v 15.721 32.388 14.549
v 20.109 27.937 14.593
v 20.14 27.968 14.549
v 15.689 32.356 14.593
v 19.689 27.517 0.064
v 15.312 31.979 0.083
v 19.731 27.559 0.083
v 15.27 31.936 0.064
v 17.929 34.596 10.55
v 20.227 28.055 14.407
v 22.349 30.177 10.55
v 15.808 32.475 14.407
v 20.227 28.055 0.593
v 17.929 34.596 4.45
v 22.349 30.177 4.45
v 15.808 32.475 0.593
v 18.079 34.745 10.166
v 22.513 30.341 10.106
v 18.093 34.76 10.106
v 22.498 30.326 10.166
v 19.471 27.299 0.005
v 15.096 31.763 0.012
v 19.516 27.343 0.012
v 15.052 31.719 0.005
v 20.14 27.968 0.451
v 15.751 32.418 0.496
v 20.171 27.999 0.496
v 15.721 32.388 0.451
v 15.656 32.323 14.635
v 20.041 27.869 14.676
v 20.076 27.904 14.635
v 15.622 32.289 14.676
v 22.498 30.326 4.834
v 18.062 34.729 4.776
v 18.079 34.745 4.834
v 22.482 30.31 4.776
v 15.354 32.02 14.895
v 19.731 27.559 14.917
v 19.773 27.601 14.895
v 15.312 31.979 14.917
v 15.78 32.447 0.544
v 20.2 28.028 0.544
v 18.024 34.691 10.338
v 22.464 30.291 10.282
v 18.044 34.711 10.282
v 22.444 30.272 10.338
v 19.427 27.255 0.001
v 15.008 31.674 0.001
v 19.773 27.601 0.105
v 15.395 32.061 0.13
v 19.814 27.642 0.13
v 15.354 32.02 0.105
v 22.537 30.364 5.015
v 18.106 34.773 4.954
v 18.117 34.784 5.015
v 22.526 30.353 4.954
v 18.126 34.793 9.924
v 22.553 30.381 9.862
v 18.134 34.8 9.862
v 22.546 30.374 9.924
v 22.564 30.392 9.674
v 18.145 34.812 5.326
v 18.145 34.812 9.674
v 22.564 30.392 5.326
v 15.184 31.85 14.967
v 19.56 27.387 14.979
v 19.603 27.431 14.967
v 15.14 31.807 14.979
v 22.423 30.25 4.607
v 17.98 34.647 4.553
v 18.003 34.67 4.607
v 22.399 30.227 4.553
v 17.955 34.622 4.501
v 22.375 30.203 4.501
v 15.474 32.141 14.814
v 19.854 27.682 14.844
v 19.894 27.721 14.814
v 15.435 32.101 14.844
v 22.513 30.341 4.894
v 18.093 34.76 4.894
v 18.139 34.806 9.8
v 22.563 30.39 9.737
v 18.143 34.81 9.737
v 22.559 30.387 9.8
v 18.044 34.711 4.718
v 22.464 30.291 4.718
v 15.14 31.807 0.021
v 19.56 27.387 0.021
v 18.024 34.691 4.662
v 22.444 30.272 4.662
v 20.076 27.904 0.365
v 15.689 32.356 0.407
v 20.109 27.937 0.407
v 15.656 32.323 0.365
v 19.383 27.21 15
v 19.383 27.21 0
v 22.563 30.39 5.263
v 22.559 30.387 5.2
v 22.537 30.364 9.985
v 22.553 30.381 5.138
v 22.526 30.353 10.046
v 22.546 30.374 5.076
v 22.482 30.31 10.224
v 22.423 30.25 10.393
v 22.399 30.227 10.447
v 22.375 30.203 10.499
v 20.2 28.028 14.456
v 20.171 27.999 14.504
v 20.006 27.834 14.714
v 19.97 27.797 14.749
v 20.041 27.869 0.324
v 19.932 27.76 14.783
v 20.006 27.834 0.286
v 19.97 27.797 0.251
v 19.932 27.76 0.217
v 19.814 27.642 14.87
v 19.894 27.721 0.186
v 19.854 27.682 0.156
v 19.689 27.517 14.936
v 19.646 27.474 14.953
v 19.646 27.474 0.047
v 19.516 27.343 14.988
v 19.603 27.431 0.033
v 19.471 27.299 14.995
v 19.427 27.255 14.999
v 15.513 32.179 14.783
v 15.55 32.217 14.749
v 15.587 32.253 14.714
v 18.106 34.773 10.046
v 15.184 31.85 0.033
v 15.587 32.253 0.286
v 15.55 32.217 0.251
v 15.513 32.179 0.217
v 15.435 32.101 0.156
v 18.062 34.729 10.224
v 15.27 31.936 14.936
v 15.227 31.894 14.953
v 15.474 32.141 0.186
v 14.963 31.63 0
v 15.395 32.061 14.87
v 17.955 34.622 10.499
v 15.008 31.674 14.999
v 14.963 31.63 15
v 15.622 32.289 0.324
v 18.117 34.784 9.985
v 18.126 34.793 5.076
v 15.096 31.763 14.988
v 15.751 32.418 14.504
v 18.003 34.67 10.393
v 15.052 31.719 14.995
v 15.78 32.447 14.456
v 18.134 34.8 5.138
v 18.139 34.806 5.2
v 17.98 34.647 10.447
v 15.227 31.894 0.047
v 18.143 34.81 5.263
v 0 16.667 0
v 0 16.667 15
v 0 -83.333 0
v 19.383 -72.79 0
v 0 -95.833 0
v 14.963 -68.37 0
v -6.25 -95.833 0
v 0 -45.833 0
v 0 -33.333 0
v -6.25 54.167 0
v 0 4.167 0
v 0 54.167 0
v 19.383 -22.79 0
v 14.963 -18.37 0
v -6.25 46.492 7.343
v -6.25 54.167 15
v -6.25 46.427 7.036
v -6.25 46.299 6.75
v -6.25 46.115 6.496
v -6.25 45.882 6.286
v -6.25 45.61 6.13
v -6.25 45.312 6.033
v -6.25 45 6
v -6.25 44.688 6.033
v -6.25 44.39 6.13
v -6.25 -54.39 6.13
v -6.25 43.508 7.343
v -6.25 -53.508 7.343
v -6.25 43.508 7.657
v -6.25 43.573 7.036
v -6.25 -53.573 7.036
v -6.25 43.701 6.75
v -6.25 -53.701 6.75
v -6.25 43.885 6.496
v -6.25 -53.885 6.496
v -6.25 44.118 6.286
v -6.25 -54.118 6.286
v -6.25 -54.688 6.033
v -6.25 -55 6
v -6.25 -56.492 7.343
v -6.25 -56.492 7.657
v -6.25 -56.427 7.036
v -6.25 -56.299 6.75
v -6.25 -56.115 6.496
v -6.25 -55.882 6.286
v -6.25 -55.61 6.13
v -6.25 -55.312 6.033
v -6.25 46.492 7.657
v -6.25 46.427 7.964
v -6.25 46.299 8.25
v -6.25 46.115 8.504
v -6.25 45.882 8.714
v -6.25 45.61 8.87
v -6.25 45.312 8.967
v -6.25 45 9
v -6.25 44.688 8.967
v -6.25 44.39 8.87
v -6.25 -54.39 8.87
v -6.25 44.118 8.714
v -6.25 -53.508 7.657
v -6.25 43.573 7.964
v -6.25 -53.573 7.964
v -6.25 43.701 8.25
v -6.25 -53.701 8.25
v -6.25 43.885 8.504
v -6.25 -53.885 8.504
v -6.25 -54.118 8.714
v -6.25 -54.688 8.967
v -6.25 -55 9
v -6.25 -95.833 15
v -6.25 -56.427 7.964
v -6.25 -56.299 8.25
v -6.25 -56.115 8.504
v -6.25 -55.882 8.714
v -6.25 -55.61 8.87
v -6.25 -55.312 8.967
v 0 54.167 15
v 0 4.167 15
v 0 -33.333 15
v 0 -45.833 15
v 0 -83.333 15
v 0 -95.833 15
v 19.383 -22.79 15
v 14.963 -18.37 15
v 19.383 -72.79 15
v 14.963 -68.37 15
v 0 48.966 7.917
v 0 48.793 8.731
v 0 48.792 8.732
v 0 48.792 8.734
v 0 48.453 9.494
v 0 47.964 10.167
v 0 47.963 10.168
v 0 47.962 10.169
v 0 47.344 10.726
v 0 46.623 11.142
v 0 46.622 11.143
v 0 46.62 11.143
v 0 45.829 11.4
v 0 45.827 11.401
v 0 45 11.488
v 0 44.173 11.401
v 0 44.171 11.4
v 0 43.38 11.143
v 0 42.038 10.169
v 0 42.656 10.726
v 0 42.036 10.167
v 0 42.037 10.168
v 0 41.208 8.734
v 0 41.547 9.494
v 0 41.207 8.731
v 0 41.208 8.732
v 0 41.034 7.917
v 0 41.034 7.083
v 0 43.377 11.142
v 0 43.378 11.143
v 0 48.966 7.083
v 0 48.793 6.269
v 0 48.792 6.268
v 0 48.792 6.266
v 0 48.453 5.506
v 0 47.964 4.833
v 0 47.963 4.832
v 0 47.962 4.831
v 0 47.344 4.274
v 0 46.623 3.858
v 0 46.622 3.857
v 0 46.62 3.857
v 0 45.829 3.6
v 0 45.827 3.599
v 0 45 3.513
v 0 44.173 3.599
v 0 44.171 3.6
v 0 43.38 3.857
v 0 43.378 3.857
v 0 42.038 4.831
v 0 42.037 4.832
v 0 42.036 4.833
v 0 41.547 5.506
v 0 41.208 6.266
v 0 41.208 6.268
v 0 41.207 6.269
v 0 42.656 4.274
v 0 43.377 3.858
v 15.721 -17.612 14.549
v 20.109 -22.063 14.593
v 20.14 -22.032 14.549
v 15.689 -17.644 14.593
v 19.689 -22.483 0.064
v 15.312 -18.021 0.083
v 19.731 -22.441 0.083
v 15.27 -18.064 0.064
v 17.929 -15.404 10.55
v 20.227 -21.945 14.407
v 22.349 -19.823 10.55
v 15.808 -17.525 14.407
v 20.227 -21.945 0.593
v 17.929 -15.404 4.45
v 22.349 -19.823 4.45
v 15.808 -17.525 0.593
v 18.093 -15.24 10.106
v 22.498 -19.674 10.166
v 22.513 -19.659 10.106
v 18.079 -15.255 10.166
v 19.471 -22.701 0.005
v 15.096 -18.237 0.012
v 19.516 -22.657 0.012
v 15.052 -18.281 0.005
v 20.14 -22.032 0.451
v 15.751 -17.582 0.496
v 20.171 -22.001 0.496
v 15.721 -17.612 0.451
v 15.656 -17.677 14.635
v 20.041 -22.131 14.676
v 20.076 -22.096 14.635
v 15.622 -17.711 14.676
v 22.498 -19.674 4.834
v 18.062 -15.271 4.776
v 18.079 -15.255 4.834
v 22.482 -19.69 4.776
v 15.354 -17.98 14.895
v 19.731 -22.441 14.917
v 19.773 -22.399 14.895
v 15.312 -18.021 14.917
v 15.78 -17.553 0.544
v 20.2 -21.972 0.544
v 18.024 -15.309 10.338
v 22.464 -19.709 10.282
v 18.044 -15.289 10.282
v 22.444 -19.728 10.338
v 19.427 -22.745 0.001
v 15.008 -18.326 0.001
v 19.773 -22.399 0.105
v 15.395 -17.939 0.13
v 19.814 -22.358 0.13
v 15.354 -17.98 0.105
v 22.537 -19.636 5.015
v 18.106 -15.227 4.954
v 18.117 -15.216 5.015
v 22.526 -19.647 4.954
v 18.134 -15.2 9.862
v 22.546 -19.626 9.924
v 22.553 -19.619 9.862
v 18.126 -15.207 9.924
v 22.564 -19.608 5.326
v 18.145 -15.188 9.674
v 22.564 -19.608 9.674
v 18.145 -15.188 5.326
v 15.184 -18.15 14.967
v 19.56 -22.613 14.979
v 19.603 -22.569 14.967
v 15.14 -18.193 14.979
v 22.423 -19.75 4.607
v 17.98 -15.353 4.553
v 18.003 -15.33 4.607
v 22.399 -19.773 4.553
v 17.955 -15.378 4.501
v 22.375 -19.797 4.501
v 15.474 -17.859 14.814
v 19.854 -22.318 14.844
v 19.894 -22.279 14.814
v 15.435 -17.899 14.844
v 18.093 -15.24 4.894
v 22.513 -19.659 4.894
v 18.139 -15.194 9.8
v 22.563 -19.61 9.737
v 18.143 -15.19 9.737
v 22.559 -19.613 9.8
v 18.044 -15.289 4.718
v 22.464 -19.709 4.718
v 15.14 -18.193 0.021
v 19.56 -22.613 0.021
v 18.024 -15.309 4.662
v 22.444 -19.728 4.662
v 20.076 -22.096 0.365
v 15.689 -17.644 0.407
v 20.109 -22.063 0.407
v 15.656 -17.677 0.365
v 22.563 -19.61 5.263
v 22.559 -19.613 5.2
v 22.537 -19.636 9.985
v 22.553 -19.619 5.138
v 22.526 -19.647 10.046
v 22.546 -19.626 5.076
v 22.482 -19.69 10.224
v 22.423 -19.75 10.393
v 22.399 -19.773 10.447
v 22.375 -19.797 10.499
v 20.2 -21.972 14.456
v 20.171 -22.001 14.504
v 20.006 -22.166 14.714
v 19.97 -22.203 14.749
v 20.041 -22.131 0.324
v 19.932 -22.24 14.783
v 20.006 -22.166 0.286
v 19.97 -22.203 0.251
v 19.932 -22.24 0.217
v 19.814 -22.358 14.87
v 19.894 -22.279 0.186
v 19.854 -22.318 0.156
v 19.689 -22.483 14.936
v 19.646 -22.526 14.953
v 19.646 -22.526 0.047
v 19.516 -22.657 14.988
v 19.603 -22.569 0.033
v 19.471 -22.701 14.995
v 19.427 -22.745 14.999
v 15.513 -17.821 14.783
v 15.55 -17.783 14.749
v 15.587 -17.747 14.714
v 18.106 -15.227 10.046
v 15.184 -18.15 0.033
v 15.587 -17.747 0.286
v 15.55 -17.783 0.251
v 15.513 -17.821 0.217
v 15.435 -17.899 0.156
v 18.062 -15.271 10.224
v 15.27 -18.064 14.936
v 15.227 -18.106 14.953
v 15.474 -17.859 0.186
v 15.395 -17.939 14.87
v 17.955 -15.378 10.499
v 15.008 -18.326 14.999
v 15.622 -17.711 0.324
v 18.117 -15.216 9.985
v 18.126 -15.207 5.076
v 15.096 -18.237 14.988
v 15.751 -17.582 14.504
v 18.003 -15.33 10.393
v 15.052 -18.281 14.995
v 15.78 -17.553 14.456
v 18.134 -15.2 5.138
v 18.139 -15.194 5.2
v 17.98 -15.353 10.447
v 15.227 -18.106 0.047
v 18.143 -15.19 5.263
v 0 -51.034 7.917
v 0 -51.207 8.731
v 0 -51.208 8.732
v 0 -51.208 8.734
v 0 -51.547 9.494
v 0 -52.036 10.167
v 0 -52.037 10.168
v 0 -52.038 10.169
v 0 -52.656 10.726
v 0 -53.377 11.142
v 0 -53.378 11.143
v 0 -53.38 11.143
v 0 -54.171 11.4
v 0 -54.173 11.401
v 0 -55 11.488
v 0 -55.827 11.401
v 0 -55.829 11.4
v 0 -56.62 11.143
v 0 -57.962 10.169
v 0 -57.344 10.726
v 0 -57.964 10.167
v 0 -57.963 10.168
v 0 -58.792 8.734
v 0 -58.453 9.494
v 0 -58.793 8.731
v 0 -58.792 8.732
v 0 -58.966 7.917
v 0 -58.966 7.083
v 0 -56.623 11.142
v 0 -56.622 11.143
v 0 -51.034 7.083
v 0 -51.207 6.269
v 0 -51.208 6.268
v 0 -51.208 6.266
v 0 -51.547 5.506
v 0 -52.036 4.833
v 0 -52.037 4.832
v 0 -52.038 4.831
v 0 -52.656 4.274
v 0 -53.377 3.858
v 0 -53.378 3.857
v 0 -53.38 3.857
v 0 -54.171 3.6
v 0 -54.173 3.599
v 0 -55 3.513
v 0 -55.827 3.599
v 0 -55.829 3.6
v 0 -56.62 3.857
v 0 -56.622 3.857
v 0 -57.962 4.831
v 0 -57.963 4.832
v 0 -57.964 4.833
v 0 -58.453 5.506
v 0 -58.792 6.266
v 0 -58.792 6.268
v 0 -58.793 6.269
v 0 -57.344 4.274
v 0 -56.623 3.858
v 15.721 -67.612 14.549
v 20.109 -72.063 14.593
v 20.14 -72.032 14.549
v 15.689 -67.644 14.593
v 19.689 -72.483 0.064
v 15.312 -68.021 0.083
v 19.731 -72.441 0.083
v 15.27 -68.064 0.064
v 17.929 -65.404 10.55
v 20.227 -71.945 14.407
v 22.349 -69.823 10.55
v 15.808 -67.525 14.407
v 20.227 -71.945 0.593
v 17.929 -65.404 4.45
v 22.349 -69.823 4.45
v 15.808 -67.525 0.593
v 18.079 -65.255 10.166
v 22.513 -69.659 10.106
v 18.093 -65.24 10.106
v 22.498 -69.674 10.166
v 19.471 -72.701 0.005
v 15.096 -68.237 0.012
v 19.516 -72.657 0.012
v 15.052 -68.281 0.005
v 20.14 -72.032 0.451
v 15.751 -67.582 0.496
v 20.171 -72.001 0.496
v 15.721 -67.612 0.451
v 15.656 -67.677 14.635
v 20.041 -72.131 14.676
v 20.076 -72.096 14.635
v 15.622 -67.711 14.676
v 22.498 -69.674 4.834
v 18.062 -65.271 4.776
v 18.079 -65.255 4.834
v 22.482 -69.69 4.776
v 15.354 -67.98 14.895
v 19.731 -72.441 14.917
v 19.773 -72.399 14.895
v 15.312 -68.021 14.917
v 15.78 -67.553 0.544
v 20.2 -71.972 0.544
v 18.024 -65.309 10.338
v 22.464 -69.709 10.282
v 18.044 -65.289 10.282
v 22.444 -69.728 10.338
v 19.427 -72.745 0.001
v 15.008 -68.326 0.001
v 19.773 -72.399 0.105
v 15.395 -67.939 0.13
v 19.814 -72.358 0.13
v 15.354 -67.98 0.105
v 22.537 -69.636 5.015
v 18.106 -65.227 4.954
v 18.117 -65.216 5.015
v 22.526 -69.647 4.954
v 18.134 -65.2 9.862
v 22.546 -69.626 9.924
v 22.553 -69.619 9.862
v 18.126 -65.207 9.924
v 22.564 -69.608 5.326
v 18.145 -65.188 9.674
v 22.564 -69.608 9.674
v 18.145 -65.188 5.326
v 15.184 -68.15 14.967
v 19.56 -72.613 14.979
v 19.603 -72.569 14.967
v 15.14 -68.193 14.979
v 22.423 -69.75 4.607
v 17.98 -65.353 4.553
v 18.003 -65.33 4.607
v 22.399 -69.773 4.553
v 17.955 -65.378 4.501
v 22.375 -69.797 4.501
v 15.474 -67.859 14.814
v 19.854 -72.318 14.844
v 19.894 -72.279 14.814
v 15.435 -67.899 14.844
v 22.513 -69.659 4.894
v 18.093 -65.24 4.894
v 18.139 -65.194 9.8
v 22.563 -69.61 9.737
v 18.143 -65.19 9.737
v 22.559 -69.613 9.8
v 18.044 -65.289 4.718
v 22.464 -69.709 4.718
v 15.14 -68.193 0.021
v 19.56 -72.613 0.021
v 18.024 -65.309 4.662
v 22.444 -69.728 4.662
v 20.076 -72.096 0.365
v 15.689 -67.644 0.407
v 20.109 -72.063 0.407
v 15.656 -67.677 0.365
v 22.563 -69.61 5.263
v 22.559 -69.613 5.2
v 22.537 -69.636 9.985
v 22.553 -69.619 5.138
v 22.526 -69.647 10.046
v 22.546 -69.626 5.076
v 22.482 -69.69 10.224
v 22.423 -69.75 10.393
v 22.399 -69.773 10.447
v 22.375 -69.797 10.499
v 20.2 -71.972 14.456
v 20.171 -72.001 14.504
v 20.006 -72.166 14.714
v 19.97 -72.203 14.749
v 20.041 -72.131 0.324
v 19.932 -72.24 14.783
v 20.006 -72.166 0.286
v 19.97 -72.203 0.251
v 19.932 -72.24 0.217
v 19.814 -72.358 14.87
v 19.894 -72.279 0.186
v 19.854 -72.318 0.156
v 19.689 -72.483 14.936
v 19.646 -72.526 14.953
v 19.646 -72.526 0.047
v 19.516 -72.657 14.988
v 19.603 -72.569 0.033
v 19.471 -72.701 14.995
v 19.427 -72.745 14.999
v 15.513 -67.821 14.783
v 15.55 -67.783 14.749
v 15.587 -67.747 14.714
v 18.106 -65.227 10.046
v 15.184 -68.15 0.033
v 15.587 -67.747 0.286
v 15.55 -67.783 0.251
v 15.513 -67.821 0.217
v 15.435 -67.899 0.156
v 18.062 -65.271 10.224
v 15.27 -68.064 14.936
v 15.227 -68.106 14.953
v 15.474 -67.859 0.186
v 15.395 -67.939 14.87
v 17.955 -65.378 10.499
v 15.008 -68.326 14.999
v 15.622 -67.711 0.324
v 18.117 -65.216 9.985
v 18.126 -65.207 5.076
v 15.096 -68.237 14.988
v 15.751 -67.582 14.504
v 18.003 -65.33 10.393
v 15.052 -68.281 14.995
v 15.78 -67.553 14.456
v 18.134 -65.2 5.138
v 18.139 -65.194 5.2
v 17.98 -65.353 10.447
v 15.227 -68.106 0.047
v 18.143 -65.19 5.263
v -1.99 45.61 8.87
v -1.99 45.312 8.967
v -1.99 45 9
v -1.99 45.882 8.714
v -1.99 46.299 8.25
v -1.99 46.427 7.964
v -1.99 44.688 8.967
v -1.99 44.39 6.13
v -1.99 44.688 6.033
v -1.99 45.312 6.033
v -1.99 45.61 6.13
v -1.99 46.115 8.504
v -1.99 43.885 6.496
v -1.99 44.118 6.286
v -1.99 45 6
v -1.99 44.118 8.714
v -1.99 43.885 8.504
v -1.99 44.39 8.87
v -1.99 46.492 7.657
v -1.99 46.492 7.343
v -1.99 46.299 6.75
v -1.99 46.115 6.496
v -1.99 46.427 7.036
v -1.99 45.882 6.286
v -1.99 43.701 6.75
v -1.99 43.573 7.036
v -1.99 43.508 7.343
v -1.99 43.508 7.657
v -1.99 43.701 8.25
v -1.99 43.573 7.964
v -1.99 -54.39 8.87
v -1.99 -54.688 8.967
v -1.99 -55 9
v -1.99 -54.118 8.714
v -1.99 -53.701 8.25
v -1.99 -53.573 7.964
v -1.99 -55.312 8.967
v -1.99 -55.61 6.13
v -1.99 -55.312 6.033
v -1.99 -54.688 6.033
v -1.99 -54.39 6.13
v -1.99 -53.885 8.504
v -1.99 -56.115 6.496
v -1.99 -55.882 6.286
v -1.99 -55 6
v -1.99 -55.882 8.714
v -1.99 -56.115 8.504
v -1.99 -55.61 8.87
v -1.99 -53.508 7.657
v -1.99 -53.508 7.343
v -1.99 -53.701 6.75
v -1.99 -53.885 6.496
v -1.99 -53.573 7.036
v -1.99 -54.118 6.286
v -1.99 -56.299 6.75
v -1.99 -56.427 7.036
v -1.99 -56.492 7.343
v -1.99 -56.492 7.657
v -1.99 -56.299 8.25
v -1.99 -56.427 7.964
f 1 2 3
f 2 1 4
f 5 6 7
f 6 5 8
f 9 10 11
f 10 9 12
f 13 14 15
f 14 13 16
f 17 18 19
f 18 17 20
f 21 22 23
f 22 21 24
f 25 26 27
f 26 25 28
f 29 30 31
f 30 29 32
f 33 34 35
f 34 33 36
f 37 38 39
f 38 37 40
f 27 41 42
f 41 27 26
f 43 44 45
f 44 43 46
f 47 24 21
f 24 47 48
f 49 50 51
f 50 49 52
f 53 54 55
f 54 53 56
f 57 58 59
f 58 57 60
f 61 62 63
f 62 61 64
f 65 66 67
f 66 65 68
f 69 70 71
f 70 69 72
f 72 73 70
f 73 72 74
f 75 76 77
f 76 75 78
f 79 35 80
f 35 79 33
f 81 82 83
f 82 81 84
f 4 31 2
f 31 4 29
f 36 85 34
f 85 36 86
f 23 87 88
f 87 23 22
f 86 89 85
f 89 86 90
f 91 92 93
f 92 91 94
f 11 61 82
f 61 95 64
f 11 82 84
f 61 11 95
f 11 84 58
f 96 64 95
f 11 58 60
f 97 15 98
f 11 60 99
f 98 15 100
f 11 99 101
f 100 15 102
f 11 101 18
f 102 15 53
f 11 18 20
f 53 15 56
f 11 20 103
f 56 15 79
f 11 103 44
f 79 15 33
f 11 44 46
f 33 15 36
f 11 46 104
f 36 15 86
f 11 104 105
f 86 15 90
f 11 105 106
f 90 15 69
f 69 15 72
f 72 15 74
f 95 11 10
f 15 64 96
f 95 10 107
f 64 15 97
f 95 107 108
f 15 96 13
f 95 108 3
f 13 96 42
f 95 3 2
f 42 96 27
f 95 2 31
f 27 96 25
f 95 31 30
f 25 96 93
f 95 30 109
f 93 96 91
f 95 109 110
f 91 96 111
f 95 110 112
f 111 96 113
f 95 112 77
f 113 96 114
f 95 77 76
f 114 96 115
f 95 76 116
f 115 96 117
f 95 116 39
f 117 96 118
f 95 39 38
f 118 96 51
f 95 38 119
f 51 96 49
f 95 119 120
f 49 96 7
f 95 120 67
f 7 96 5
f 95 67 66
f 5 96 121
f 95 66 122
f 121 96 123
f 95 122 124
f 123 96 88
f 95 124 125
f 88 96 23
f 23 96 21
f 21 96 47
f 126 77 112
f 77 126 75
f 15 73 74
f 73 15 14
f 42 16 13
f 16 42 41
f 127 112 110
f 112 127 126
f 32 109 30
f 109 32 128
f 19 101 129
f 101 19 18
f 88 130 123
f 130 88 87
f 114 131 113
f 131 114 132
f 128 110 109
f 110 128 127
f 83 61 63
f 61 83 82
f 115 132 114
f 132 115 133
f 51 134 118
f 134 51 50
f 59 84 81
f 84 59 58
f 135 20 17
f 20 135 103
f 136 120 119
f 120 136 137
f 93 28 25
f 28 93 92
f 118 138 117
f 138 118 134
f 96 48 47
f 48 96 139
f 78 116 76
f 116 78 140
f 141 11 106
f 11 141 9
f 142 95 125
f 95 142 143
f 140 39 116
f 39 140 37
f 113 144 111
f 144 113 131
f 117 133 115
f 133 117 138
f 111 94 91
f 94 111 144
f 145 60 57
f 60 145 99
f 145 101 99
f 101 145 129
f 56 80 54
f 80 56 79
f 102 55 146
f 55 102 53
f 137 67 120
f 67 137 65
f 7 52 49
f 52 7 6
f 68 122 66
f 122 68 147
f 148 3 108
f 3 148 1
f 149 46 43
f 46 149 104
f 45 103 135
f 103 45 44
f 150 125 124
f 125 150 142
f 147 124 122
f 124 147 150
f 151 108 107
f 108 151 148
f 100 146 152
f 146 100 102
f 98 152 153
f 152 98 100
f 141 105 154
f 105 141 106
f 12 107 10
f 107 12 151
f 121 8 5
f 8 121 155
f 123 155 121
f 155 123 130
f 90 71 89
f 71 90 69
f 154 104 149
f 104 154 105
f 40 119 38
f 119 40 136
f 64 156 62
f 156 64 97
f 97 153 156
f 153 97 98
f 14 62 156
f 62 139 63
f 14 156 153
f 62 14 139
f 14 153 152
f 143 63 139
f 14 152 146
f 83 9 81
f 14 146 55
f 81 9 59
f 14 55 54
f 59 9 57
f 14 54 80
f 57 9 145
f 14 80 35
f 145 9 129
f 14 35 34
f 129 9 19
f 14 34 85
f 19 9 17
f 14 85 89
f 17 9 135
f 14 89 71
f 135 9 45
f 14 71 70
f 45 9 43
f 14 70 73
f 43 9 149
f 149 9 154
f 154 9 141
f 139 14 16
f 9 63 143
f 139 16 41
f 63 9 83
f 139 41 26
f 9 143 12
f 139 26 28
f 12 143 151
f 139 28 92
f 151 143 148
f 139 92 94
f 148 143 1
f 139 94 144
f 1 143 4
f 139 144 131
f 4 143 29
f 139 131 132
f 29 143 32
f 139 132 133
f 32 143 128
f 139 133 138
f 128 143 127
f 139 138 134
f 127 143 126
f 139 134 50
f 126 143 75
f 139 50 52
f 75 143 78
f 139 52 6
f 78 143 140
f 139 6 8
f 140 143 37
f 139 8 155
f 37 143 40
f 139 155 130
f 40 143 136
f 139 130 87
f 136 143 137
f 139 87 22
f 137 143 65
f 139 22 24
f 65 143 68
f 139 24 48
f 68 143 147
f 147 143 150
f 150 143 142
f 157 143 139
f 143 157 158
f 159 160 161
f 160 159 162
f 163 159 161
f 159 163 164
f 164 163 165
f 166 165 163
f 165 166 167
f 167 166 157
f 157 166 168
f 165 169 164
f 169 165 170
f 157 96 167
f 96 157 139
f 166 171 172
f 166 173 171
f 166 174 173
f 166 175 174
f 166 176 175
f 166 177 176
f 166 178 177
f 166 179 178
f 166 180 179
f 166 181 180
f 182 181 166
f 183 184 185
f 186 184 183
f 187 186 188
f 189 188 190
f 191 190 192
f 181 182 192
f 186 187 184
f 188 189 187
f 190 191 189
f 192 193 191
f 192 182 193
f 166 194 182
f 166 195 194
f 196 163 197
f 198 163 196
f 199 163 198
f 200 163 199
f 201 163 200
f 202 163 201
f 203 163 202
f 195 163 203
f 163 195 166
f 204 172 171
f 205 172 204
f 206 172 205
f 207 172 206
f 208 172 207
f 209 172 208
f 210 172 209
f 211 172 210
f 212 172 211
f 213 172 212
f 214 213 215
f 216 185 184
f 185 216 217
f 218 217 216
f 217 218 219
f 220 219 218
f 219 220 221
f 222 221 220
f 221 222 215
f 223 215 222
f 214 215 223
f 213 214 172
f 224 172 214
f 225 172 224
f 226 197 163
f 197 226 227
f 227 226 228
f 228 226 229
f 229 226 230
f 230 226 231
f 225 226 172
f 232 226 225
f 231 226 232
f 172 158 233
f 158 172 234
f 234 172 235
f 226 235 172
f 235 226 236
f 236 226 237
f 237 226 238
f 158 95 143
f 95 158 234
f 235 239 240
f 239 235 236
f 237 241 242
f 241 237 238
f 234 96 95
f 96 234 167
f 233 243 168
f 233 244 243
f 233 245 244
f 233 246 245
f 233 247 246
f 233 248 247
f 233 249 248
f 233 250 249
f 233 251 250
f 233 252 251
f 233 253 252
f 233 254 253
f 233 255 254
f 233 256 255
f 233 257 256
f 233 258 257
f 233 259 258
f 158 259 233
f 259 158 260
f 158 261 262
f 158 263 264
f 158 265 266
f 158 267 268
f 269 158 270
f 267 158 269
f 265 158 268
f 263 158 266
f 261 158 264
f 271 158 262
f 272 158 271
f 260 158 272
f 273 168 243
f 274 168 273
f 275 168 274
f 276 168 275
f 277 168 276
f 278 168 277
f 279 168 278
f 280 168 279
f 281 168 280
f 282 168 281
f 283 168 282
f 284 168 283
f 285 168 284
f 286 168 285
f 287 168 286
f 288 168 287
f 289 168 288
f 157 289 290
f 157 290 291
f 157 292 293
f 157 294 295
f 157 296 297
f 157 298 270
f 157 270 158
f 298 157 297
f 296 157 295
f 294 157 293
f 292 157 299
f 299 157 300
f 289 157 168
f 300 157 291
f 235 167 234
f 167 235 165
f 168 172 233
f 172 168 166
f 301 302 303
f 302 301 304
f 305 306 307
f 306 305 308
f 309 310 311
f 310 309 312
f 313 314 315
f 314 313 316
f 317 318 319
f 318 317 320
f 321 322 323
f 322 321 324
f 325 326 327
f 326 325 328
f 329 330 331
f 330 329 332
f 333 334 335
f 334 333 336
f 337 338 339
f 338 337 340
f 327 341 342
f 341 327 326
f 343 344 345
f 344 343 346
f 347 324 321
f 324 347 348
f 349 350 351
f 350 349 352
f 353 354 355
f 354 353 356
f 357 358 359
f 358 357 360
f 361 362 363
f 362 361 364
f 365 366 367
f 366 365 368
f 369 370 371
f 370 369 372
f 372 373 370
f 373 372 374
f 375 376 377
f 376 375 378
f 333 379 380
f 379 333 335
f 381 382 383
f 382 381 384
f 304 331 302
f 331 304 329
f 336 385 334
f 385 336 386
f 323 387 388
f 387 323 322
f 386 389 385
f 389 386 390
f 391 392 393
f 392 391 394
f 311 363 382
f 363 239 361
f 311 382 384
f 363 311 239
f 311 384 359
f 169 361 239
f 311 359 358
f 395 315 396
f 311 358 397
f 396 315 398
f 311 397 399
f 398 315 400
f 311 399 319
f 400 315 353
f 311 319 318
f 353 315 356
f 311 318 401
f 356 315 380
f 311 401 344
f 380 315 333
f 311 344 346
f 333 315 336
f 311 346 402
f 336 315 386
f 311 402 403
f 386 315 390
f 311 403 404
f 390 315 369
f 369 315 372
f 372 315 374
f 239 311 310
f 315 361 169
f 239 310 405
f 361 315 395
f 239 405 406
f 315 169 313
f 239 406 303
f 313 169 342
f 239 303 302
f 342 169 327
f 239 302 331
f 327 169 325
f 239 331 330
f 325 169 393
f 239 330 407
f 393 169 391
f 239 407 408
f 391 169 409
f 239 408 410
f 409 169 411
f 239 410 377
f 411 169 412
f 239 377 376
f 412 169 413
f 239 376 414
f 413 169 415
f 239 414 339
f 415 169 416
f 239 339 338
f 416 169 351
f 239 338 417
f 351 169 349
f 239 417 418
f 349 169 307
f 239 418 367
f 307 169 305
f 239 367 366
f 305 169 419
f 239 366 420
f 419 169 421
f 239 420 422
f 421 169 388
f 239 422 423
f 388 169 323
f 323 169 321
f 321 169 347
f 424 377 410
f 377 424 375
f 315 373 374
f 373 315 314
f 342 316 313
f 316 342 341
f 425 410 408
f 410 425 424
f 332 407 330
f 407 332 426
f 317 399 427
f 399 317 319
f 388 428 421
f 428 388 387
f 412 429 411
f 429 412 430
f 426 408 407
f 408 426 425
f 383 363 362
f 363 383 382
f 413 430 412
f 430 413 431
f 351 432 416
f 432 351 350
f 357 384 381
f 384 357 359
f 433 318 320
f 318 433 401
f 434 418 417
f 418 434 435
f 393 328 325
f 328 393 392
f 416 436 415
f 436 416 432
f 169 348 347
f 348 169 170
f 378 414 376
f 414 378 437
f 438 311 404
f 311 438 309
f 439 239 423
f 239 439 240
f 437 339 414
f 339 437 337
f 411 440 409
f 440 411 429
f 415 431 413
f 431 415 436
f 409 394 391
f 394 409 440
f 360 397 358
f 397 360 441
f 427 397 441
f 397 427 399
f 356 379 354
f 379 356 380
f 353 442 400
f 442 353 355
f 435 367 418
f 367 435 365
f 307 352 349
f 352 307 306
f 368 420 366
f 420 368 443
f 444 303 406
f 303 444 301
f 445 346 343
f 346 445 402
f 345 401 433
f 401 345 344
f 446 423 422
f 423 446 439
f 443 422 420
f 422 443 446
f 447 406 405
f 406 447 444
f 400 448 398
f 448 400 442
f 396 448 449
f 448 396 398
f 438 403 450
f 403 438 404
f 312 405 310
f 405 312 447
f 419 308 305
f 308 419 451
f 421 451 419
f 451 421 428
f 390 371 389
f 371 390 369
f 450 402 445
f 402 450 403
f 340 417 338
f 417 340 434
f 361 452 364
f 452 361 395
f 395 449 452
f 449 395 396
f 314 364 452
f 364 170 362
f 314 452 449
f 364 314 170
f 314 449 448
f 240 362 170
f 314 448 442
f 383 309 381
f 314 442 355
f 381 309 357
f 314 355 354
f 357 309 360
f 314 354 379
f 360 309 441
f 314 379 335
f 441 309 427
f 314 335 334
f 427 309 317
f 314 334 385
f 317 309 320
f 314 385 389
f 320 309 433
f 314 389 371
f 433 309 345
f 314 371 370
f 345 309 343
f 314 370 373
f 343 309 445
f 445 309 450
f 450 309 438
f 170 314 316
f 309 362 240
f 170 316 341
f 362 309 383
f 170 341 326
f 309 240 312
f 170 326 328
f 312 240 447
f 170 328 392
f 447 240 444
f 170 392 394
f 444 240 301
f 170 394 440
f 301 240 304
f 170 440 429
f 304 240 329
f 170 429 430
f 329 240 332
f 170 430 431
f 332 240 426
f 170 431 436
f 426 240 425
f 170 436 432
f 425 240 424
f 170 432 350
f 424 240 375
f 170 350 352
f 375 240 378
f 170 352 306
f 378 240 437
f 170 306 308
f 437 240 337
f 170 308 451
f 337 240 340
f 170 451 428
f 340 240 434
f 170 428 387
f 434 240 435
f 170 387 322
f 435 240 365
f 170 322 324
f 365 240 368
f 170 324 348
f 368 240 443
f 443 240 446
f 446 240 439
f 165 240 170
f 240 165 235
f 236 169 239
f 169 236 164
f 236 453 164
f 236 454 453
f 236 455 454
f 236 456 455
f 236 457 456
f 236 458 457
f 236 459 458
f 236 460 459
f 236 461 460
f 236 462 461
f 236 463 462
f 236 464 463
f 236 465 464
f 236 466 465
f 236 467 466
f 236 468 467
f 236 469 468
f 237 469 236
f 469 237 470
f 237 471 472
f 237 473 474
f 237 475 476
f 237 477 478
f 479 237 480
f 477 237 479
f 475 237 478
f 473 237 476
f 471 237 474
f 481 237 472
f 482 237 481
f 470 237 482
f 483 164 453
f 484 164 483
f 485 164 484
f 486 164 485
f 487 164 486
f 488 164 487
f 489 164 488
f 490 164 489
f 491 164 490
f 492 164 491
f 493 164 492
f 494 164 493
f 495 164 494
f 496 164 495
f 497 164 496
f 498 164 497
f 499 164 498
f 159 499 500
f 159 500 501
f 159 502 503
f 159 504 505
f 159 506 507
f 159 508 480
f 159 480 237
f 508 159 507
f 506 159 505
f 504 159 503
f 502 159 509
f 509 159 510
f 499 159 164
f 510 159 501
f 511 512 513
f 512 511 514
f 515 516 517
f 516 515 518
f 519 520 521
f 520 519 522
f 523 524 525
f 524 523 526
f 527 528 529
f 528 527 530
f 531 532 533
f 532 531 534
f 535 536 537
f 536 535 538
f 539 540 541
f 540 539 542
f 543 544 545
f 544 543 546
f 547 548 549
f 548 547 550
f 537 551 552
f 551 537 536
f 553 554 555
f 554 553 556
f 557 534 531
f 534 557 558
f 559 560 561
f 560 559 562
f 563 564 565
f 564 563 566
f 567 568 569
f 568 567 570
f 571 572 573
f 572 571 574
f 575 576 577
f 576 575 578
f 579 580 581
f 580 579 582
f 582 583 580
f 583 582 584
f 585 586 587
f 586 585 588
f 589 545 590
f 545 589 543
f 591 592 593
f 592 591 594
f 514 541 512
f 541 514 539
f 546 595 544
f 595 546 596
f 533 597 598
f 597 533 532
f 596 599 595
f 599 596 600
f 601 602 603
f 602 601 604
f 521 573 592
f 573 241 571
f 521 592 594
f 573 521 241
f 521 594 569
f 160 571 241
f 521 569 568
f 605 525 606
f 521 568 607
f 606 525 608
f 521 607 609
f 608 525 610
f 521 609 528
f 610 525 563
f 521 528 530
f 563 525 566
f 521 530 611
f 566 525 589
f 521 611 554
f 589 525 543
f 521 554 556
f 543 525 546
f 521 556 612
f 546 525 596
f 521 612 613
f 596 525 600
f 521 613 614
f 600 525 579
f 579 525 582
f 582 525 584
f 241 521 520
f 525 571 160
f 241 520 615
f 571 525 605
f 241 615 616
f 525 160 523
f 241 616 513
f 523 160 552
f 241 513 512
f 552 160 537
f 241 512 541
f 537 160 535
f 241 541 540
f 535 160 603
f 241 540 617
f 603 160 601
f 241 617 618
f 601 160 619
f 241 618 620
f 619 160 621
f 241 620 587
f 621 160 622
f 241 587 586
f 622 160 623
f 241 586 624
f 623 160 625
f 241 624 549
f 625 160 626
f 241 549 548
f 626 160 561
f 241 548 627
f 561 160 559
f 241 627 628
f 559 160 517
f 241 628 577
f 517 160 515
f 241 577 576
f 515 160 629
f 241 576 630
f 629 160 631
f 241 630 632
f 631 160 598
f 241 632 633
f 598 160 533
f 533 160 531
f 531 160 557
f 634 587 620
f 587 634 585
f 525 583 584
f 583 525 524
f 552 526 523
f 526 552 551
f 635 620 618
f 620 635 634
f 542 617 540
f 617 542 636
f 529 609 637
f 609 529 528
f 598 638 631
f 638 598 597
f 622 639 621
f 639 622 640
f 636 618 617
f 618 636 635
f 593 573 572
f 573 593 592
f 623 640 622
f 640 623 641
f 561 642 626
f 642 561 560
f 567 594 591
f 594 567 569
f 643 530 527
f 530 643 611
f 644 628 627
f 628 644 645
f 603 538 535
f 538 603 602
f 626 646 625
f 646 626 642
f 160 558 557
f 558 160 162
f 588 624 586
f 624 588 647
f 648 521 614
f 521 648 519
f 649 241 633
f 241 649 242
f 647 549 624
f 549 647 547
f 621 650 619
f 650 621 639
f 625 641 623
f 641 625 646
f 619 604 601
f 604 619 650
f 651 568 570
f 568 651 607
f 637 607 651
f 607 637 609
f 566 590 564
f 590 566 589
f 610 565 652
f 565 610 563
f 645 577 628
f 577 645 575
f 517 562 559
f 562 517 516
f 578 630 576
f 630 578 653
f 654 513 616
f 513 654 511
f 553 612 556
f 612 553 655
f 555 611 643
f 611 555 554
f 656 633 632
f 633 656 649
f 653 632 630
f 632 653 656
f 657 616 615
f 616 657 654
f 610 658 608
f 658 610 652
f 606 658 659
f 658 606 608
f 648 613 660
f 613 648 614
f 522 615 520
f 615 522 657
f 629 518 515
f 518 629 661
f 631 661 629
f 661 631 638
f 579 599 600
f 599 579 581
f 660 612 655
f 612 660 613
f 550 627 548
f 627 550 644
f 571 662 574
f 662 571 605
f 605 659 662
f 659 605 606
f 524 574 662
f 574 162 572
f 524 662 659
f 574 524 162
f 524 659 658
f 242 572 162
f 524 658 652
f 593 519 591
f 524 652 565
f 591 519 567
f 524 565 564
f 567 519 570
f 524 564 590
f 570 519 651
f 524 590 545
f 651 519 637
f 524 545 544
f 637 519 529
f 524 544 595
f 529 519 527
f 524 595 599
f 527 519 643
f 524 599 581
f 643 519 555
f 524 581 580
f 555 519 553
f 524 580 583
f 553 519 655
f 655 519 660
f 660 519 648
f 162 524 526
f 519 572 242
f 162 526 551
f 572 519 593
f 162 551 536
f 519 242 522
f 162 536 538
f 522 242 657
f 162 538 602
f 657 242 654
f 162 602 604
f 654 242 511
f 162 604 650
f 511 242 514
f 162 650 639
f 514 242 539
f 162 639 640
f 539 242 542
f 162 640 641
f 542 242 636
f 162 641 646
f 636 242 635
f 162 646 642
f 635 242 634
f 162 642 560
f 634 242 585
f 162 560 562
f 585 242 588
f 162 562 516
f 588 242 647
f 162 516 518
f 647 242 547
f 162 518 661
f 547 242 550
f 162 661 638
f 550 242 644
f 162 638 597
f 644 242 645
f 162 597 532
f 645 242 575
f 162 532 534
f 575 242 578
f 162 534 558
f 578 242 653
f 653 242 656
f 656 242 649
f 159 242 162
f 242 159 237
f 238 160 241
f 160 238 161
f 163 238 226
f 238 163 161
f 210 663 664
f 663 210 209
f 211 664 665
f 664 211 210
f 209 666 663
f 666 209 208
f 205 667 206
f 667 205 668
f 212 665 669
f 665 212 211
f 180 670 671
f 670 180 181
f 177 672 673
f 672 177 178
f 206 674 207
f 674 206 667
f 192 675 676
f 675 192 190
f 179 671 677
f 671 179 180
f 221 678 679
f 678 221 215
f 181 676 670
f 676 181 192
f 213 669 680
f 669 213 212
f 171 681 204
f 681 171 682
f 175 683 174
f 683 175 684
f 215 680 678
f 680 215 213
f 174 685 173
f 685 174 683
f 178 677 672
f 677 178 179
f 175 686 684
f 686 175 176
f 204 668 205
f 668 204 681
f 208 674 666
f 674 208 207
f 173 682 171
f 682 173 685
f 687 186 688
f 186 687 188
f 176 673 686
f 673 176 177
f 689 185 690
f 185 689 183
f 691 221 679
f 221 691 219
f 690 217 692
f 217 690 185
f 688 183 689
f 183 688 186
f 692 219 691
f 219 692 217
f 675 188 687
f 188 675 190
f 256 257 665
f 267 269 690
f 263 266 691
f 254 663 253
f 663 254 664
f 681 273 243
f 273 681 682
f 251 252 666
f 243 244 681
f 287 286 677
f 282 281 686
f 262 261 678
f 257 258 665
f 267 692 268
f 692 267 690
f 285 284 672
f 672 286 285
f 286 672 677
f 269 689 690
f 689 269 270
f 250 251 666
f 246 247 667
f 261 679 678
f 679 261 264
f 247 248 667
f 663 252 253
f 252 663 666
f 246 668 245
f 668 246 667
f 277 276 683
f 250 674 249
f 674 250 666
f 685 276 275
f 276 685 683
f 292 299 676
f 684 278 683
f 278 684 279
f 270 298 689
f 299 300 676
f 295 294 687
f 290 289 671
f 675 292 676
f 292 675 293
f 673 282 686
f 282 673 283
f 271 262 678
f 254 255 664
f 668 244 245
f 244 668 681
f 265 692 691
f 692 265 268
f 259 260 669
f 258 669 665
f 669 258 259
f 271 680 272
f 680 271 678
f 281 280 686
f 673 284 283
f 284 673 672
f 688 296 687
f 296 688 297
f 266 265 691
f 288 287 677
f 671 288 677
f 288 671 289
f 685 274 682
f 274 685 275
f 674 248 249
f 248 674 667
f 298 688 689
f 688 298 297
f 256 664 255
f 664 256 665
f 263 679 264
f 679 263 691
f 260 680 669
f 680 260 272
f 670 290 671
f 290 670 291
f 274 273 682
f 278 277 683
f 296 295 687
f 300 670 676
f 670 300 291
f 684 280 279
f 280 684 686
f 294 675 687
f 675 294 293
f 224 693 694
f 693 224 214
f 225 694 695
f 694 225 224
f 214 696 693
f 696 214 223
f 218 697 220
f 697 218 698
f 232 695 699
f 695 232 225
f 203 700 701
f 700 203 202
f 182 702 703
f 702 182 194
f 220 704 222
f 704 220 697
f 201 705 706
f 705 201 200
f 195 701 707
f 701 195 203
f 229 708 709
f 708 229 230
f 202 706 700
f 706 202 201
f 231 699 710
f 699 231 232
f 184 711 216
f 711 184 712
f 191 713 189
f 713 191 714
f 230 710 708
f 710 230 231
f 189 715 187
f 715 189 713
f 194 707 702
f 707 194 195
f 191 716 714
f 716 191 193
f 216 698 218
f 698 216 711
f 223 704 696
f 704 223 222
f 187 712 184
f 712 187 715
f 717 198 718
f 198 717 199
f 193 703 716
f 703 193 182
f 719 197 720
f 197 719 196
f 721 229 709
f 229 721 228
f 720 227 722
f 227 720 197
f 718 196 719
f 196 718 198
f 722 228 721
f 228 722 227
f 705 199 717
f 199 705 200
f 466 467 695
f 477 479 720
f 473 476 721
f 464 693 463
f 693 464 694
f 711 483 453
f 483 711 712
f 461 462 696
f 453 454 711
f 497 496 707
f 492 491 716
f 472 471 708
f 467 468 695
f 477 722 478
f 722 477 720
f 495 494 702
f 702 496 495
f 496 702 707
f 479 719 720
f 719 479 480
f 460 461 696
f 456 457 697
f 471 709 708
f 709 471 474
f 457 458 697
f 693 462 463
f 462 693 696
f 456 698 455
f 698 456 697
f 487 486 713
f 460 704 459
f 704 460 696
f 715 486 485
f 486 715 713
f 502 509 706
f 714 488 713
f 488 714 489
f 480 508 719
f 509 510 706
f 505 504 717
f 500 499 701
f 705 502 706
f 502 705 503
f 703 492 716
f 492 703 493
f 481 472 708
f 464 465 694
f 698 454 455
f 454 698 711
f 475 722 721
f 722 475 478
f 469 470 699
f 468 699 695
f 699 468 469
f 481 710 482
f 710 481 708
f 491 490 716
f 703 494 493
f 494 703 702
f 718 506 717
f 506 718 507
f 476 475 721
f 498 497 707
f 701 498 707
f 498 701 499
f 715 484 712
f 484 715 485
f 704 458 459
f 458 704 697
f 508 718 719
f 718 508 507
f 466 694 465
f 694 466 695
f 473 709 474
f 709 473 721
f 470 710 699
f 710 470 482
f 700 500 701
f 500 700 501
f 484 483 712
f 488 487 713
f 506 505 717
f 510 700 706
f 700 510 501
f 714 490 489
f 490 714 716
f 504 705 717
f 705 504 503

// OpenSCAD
/*----------------------------------------------------------------------------*/
/*-------                         INFORMATIONS                        --------*/
/*----------------------------------------------------------------------------*/
/*----------------------------------------------------------------------------*/

// CUSTOMIZABLE U-HOOK (parametric and very strong hook)
// by Serge Payen, January 2016
// www.sergepayen.fr/en/parametric-u-hook
// "customizable_u_hook" is licenced under Creative Commons :
// Attribution-NonCommercial-ShareAlike 4.0 International (CC BY-NC-SA 4.0)
// http://creativecommons.org/licenses/by-nc-sa/4.0/

// HOW TO USE THIS FILE :

// -- Solution 1 :
// Open this file with OpenScad software (free and open-source)
// http://www.openscad.org/downloads.html
// Choose your parameters in the SETTINGS chapter (see below)
// Press F5 to compile and see the resulting hook
// Check your hook's global size in the console window (below viewing area)
// If OK, press F6 to render
// Go to : File => Export => Export as STL : choose filename and location
// Save the STL file of your customized hook
// Send this STL file to your 3D printer

// -- Solution 2 :
// This file had been optimized for Thingiverse Customizer
// You will need to have a Thingiverse Account, then :
// Go to object's page on Thingiverse
// Click on the button "Open in Customizer"
// Choose your settings in parameters tabs
// Save the STL file of your customized hook
// Send this STL file to your 3D printer



/*----------------------------------------------------------------------------*/
/*-------                           SETTINGS                          --------*/
/*----------------------------------------------------------------------------*/

/* [HOOK SHAPE] */

// Pre-defined output
part=3; // [0=Custom,1=Door Towel Hook,2=Door Towel Hook X5,3=Small Conduit Hook] */

// (Custom only) Choose between classic hook with screw-holes (0) or "bracket" system (1)
bracket=0; // [0, 1]

// (Custom only) Choose between square (0) and round bracket (1)
bracket_round=0; // [0, 1]

// (Custom only) Choose to have a second hook (1) or not (0)
second_hook=0; // [0, 1]

// (Custom only) How many small hooks
second_hook_count = 4; // [0:8]



/* [MAIN HOOK SIZE] */

// Intern diameter of hook's main U shape
hook_size=25; // [0.1:250]

// Hook's "thickness" = object's width = print's height
thickness=15; // [0.1:250]



/* [SECOND HOOK] */

// length of second hook. Good values are around "Hook Size" x 0.75
second_hook_length=30; // [0.1:200]

// Angle of second hook. Best is between 45° and 65°.
second_hook_angle=45; // [0:90]



/* [SPACERS] */

// Space between main hook and bottom screw
spacer_1=10; // [0:200]

// Space between bottom screw and secondary hook
spacer_2=0; // [0:200]

// Space between second hook and top screw
spacer_3=5; // [0:200]

// Space between top screw and hook's rounded top
spacer_4=5; // [0:200]



/* [SCREW-HOLES] */

// Diameter of the screw you plan to use
screw_diam=3; // [0:0.5:20]

// Diameter of screw-head
screw_head=8; // [0:0.5:40]

// Screw-head height (deepness for screw-head hole)
screw_head_h=3; // [0:0.5:20]

// Tolerance, for screw easy-fitting
tolerance=0.5; // [0:0.1:10]



/* [BRACKET] */

// Bracket's main size
bracket_size=35; // [0:250]

// Bracket's back length
stop_length=15; // [0:250]

// Bracket Stiffness (only with square bracket)
bracket_stiffness=3; // [0:100]



/* [EXTRA SETTINGS] */

// Choose to have a screw-hole in square bracket (1), or not (0)
safety_screw=0; // [1, 0]

// Choose to have the hook's "triangle" extremity (1) or not (0)
extremity=1; // [1, 0]

// Choose to have screw-holes (1) or not (0)
screw_holes=1; // [1, 0]

// Choose to have the hook's rounded "top" (1) or not (0)
rounded_top=1; // [1, 0]



/*------------------------------------------------------------------------------

NOTE about GENERAL DIMENSIONS AND CUSTOM HEIGHTS SETTINGS :

To respect general shape's efficiency, global size is relative to "hook_size".
Change "hook_size" for a bigger or smaller hook, then choose more options.
Different values for "spacer_1,2,3,4" will change size on Y-axis.

When compiling, OpenScad will return the total dimensions in the console window.
Keep in mind the hook is printed "laying on his side" on print bed.
In the first few lines of console window (below viewing area), you can read :
ECHO : TOTAL_SIZE_ON_X_AXIS = x (total width : adjust "hook_size" and/or bracket)
ECHO : TOTAL_SIZE_ON_Y_AXIS = y (total length : adjust with "spacer_1/2/3/4")
ECHO : TOTAL_SIZE_ON_Z_AXIS = z (total height : adjust "thickness")
It will also return informations about all other strategic sizes.
Console will also display warning messages if some values are illogic.

------------------------------------------------------------------------------*/



/*----------------------------------------------------------------------------*/
/*-------                             CODE                            --------*/
/*----------------------------------------------------------------------------*/

/*____________________________________________________________________________*/
/* [HIDDEN] */
// shortcuts
stiffness=hook_size/4;
big_r=hook_size/5;
small_r=stiffness/2;
height_bottom=hook_size*2;
width_global=hook_size+stiffness*2;
half_width=width_global/2-stiffness/2;
screw_hole=screw_diam+tolerance*2;
screw_house=screw_head+tolerance*2;
bracket_move=bracket_size/2+width_global/2;
bracket_round_diam=bracket_size+stiffness*2;
min_height1=spacer_1+screw_house/2+stiffness;
min_height2=min_height1+spacer_2/2+screw_house/2;
min_height2_hg=spacer_1+stiffness+spacer_2/2;
min_height3=min_height2+spacer_3/2+spacer_2/2;
min_height3_hg=min_height2_hg+spacer_3/2+spacer_2/2;
min_height4=min_height3+spacer_4/2+spacer_3/2+screw_house;
min_height4_hg=min_height3_hg+spacer_3/2+spacer_4/2;
space_global=spacer_1+spacer_2+spacer_3+spacer_4;
$fn=150;

if(part==0) {
  bracket=_bracket;
  bracket_round=0;
  second_hook=1;
  second_hook_count = 5;
  hook_size=25;
  thickness=15;
  second_hook_length=hook_size*.9;
  second_hook_angle=55;
  spacer_1=10;
  spacer_2=10;
  spacer_3=5;
  spacer_4=5;
  screw_diam=3;
  screw_head=8;
  screw_head_h=3;
  tolerance=0.5;
  bracket_size=35;
  stop_length=15;
  bracket_stiffness=3;
  main();
} else if(part==1) {
  echo("Making Door Towel Hook");
  main();
} else if(part==2) {
  echo("Making Door Towel Hook X5");
  bracket=1;
  bracket_round=0;
  second_hook=1;
  second_hook_count = 5;
  hook_size=25;
  thickness=15;
  second_hook_length=hook_size*.9;
  second_hook_angle=55;
  spacer_1=10;
  spacer_2=10;
  spacer_3=5;
  spacer_4=5;
  screw_diam=3;
  screw_head=8;
  screw_head_h=3;
  tolerance=0.5;
  bracket_size=35;
  stop_length=15;
  bracket_stiffness=3;
  main();
} else if(part==3) {
  echo("Making Conduit Hook");
  bracket=0;
  bracket_round=0;
  second_hook=1;
  second_hook_count = 1;
  hook_size=25;
  thickness=15;
  second_hook_length=hook_size*.9;
  second_hook_angle=55;
  spacer_1=10;
  spacer_2=10;
  spacer_3=5;
  spacer_4=5;
  screw_diam=3;
  screw_head=8;
  screw_head_h=3;
  tolerance=0.5;
  bracket_size=35;
  stop_length=15;
  bracket_stiffness=3;
  difference() {
    main();
    for(y=[45,-55])
      translate([.01,y,thickness/2]) rotate([0,-90]) union(){
        cylinder(d=screw_diam,h=20,$fn=30);
        cylinder(d1=8,d2=screw_diam,h=2,$fn=30);
      }
  }
} else {
  echo("UNKNOWN PART");
}

//main();

// remove specific colors for each module

module main()
{
  if(part==3)
    
color ("Gold")
translate ([hook_size/2,-hook_size/3,thickness/2])
rotate ([0,0,0])
uhook ();

echo (TOTAL_SIZE_ON_Z_AXIS=thickness);
echo (MAIN_HOOK_INTERN_DIAMETER=hook_size);

if (bracket)
{
    echo (BRACKET_SIZE=bracket_size);
    echo (BRACKET_STIFFNESS=bracket_stiffness);
    echo (STOP_length=stop_length);
}
else
{
    echo (SCREW_HOLES_DIAMETER=screw_diam);
    echo (SCREW_HEAD_DIAMETER=screw_head);
    echo (SCREW_HEAD_HEIGHT=screw_head_h);
}

if ((bracket)&&(safety_screw))
{
    echo (SAFETY_SCREW_DIAMETER=screw_diam);
    echo (SAFETY_SCREW_HEAD_DIAMETER=screw_head);
    echo (SAFETY_SCREW_HEAD_HEIGHT=screw_head_h);
}

if (second_hook)
{
    echo (SECOND_HOOK_length=second_hook_length);
    echo (SECOND_HOOK_ANGLE=second_hook_angle);
}

}




/*____________________________________________________________________________*/
// final union of all modules
module uhook ()
{
    union ()
    {

      if(second_hook_count<=1)
      {
        // hook's base, this part don't depend on hook's type
        belly ();

        translate ([0,-height_bottom/2-stiffness,0])
        bottom ();

        translate ([half_width,stiffness,0])
        rotate ([0,90,0])
        tip ();
      }
      
        if(second_hook_count>1)
        translate([-width_global/2,-height_bottom/2-stiffness,thickness/-2])
        {
          for(i=[1:second_hook_count-1])
            translate([0,height_bottom*(2-i)-stiffness])
              arm();
        }



        // conditionnal part, depending on hook's type
        if (bracket)
        {
            translate ([-half_width,stiffness+spacer_1/2,0])
            addH1 ();
            translate ([-half_width,min_height2_hg,0])
            addH2 ();
        }
        else
        {
            translate ([-half_width,stiffness+spacer_1/2,0])
            addH1 ();
            translate ([-half_width,min_height1,0])
            screw ();
            translate ([-half_width,min_height2,0])
            addH2 ();
        }

        if ((bracket)&&(second_hook))
        {
            translate ([-width_global/2,min_height2_hg+spacer_2/2,-thickness/2])
            arm ();
            translate ([-half_width,min_height3_hg+hook_size,0])
            addH3 ();
            translate ([-half_width,min_height4_hg+hook_size,0])
            addH4 ();
            if (bracket_round)
            {
            translate ([-width_global/2-bracket_round_diam/2+stiffness,min_height4_hg+hook_size+spacer_4/2,0])
            sHook ();
            //width calculation
            width_total=width_global-stiffness+bracket_round_diam;
            echo (TOTAL_SIZE_ON_X_AXIS=width_total);
            //height calculation
            height_global=hook_size*2+stiffness*2+space_global+bracket_round_diam/2;
            echo (TOTAL_SIZE_ON_Y_AXIS=height_global);
            }
            else
            {
                translate ([-half_width,min_height4_hg+hook_size+spacer_4/2+stiffness/2,0])
                head ();
                translate ([-bracket_move,min_height4_hg+hook_size+spacer_4/2+stiffness-bracket_stiffness/2,0])
                hang ();
                //width calculation
                width_total=width_global+bracket_size+bracket_stiffness;
                echo (TOTAL_SIZE_ON_X_AXIS=width_total);
                //height calculation
                height_global=hook_size*2+stiffness*3+space_global;
                echo (TOTAL_SIZE_ON_Y_AXIS=height_global);
            }

        }

        else if (second_hook)
        {
            translate ([-width_global/2,min_height2+spacer_2/2,-thickness/2])
            arm ();
            translate ([-half_width,min_height3+hook_size,0])
            addH3 ();
            translate ([-half_width,min_height3+hook_size+spacer_3/2+screw_house/2,0])
            screw ();
            translate ([-half_width,min_height4+hook_size,0])
            addH4 ();
            translate ([-half_width,min_height4+hook_size+spacer_4/2+stiffness/2,0])
            head ();
            //height calculation
            height_global=hook_size*2+stiffness*3+screw_house*2+space_global;
            echo (TOTAL_SIZE_ON_Y_AXIS=height_global);
        }
        else if (bracket)
        {
            translate ([-half_width,min_height3_hg,0])
            addH3 ();
            translate ([-half_width,min_height4_hg,0])
            addH4 ();
            if (bracket_round)
            {
                translate ([-width_global/2-bracket_round_diam/2+stiffness,min_height4_hg+spacer_4/2,0])
                sHook ();
                //width calculation
                width_total=width_global-stiffness+bracket_round_diam;
                echo (TOTAL_SIZE_ON_X_AXIS=width_total);
                //height calculation
                height_global=hook_size+stiffness*2+space_global+bracket_round_diam/2;
                echo (TOTAL_SIZE_ON_Y_AXIS=height_global);
            }
            else
            {
                translate ([-half_width,min_height4_hg+spacer_4/2+stiffness/2,0])
                head ();
                translate ([-bracket_move,min_height4_hg+spacer_4/2+stiffness-bracket_stiffness/2,0])
                hang ();
                //width calculation
                width_total=width_global+bracket_size+bracket_stiffness;
                echo (TOTAL_SIZE_ON_X_AXIS=width_total);
                //height calculation
                height_global=hook_size+stiffness*3+space_global;
                echo (TOTAL_SIZE_ON_Y_AXIS=height_global);
            }

        }
        else
        {
            translate ([-half_width,min_height3,0])
            addH3 ();
            translate ([-half_width,min_height3+spacer_3/2+screw_house/2,0])
            screw ();
            translate ([-half_width,min_height4,0])
            addH4 ();
            translate ([-half_width,min_height4+spacer_4/2+stiffness/2,0])
            head ();
            //height calculation
            height_global=hook_size+stiffness*3+screw_house*2+space_global;
            echo (TOTAL_SIZE_ON_Y_AXIS=height_global);
        }

    }

}



/*____________________________________________________________________________*/
// hook's bottom shape, with a hole inside
module bottom ()
{
    color ("Gold")
    difference ()
    {
        // bottom
        intersection ()
        {
            cube ([width_global,height_bottom+0.1,thickness], center=true);

            translate ([-stiffness,height_bottom/2,0])
            cylinder(r=hook_size/2+stiffness*2, h=thickness+0.1, center=true);

        }

        // hole
        hull ()
        {
            translate ([-big_r/2-stiffness/4,0,0])
            cylinder (r=big_r, h=thickness+0.2, center=true);

            translate ([big_r,stiffness/2,0])
            cylinder (r=small_r, h=thickness+0.2, center=true);

        }

    }

}


/*____________________________________________________________________________*/
// main hook's U-shape
module belly ()
{
    color ("Crimson")
    difference ()
    {
        // base cube
        cube ([width_global,hook_size/2,thickness], center=true);

        // half-cylindric hole
        translate ([0,hook_size/4,0])
        cylinder (r=hook_size/2, h=thickness+0.1, center=true);

    }
}


/*____________________________________________________________________________*/
// screw-hole module
module screw ()
{
    if (thickness>screw_house*8)
    {
        color ("Silver")
        difference ()
        {
            //base cube
            cube ([stiffness,screw_house,thickness], center=true);

            if (screw_holes)
            {
                // screw1 hole
                translate ([0,0,thickness/4])
                rotate ([0,90,0])
                cylinder (d=screw_hole, h=stiffness+0.1, center=true);

                // screw1-head hole 1
                translate ([stiffness/2-screw_head_h/2+0.1,0,thickness/4])
                rotate ([0,90,0])
                cylinder (d=screw_house, h=screw_head_h, center=true);

                // screw2 hole
                translate ([0,0,-thickness/4])
                rotate ([0,90,0])
                cylinder (d=screw_hole, h=stiffness+0.1, center=true);

                // screw2-head hole 1
                translate ([stiffness/2-screw_head_h/2+0.1,0,-thickness/4])
                rotate ([0,90,0])
                cylinder (d=screw_house, h=screw_head_h, center=true);
            }
        }

    }
    else
    {
        color ("Silver")
        difference ()
        {
            //base cube
            cube ([stiffness,screw_house,thickness], center=true);

            if (screw_holes)
            {
                // screw hole
                rotate ([0,90,0])
                cylinder (d=screw_hole, h=stiffness+0.1, center=true);

                // screw-head hole
                translate ([stiffness/2-screw_head_h/2+0.1,0,0])
                rotate ([0,90,0])
                cylinder (d=screw_house, h=screw_head_h, center=true);
            }

        }
    }

}


/*____________________________________________________________________________*/
// hook's triangle extremity
module tip ()
{
    if (extremity)
    color ("Gold")
    difference ()
    {
        hull ()
        {
            translate ([thickness/2-thickness/10,0,0])
            cylinder (d=thickness/5, h=stiffness, center=true);
            translate ([-thickness/2+thickness/10,0,0])
            cylinder (d=thickness/5, h=stiffness, center=true);

            translate ([thickness/7,thickness/5,0])
            cylinder (d=thickness/5, h=stiffness, center=true);
            translate ([-thickness/7,thickness/5,0])
            cylinder (d=thickness/5, h=stiffness, center=true);
        }

        translate ([0,-thickness/4,0])
        cube ([thickness+0.1, thickness/2, thickness], center=true);

    }
    else
    {
        hull ()
        {
            translate ([thickness/2-thickness/10,0,0])
            cylinder (d=thickness/5, h=stiffness, center=true);
            translate ([-thickness/2+thickness/10,0,0])
            cylinder (d=thickness/5, h=stiffness, center=true);
        }
    }

}


/*____________________________________________________________________________*/
// secondary hook
module arm ()
{
    color ("Orange")
    union ()
    {
        cube ([stiffness, height_bottom, thickness]);

        translate ([0,stiffness,0])
        union ()
        {
            rotate ([0,0,-second_hook_angle])
            union ()
            {
                hull ()
                {
                    cube ([stiffness, second_hook_length, thickness]);
                    rotate ([0,0,second_hook_angle])
                    translate ([0,-stiffness,0])
                    cube ([stiffness, stiffness, thickness]);
                }

                rotate ([0,90,0])
                translate ([-thickness/2,second_hook_length,stiffness/2])
                tip ();
            }
        }
    }

}


/*____________________________________________________________________________*/
// hook's rounded top
module head ()
{
    color ("Gold")
    intersection ()
    {
        cube ([stiffness,stiffness,thickness], center=true);
        if (rounded_top)
        translate ([-stiffness/2,-stiffness/2,0])
        cylinder (r=stiffness, h=thickness+0.2, center=true);
    }

}


/*____________________________________________________________________________*/
// Square bracket, rectangular part to clip on a door's top
module hang ()
{
    union ()
    {
        //bracket part 1, on one side of safety screw
        color ("Crimson")
        translate ([bracket_size/4+screw_house/4,0,0])
        cube ([bracket_size/2-screw_house/2,bracket_stiffness,thickness], center=true);

        //safety screw
        if (safety_screw)
        {
            color ("Silver")
            difference ()
            {
                cube ([screw_house,bracket_stiffness,thickness],center=true);
                rotate ([90,0,0])
                cylinder (d=screw_hole, h=bracket_stiffness+0.1, center=true);
                translate ([0,bracket_stiffness/2-screw_head_h/2,0])
                rotate ([90,0,0])
                cylinder (d=screw_house, h=screw_head_h+0.1, center=true);
            }

            //bracket part 2, on the other side of safety screw
            color ("Crimson")
            translate ([-bracket_size/4-screw_house/4,0,0])
            cube ([bracket_size/2-screw_house/2,bracket_stiffness,thickness], center=true);

            //stop
            color ("Orange")
            translate ([-bracket_size/2-bracket_stiffness/2,0,0])

            union ()
            {
                // rounding part between bracket top part and stop
                intersection ()
                {
                    cube ([bracket_stiffness,bracket_stiffness,thickness],center=true);
                    translate ([bracket_stiffness/2,-bracket_stiffness/2,0])
                    cylinder (r=bracket_stiffness, h=thickness, center=true);
                }

                difference ()
                {
                    // stop main cube
                    color ("DeepSkyBlue")
                    translate ([0,-stop_length/2-bracket_stiffness/2,0])
                    cube ([bracket_stiffness,stop_length,thickness], center=true);

                    // rounding stop's bottom extremity
                    if (stop_length>=bracket_stiffness)
                    translate ([0,-stop_length,0])
                    difference ()
                    {
                        cube ([bracket_stiffness+0.1,bracket_stiffness+0.1,thickness+0.1],center=true);
                        translate ([bracket_stiffness/2,bracket_stiffness/2,0])
                        cylinder (r=bracket_stiffness, h=thickness+0.2, center=true);
                    }
                }

            }

        }

        else
        {
            union ()
            {
                //bracket main size (top part)
                color ("Crimson")
                cube ([bracket_size,bracket_stiffness,thickness],center=true);

                // rounding part between bracket top part and stop
                translate ([-bracket_size/2-bracket_stiffness/2,0,0])
                intersection ()
                {
                    cube ([bracket_stiffness,bracket_stiffness,thickness],center=true);
                    translate ([bracket_stiffness/2,-bracket_stiffness/2,0])
                    cylinder (r=bracket_stiffness, h=thickness, center=true);
                }

                difference ()
                {
                    color ("DeepSkyBlue")
                    // stop main cube
                    translate ([-bracket_size/2-bracket_stiffness/2,-stop_length/2-bracket_stiffness/2,0])
                    cube ([bracket_stiffness,stop_length,thickness], center=true);

                    // rounding stop's bottom extremity
                    if (stop_length>=bracket_stiffness)
                    translate ([-bracket_size/2-bracket_stiffness/2,-stop_length,0])
                    difference ()
                    {
                        cube ([bracket_stiffness+0.1,bracket_stiffness+0.1,thickness+0.1],center=true);
                        translate ([bracket_stiffness/2,bracket_stiffness/2,0])
                        cylinder (r=bracket_stiffness, h=thickness+0.2, center=true);
                    }
                }

            }
        }

    }
}


/*____________________________________________________________________________*/
// Rounded bracket, to clip hook on a tube
module sHook ()
union ()
{
    // difference to erase bottom half
    difference ()
    {
        // difference between extern and intern diameters
        color ("Crimson")
        difference ()
        {
            cylinder (d=bracket_round_diam, h=thickness, center=true);
            cylinder (d=bracket_size,h=thickness+0.1, center=true);
        }

        //cube to erase bottom half
        translate ([0,-bracket_round_diam/4,0])
        cube ([bracket_round_diam+0.1,bracket_round_diam/2,thickness+0.1], center=true);
    }

    // rounded extremity
    color ("DeepSkyBlue")
    hull ()
    {
        translate ([-bracket_round_diam/2+stiffness/2,0,0])
        cylinder (d=stiffness, h=thickness, center=true);
        translate ([-bracket_round_diam/2+stiffness/2,-stop_length+stiffness/2,0])
        cylinder (d=stiffness, h=thickness, center=true);
    }

}



/*____________________________________________________________________________*/
// spacer_1 : custom height above main hook, below bottom screw
module addH1 ()
{
    color ("Cyan")
    cube ([stiffness,spacer_1,thickness], center=true);
}


/*____________________________________________________________________________*/
// spacer_2 : custom height above bottom screw, below secondary hook
module addH2 ()
{
    color ("DeepSkyBlue")
    cube ([stiffness,spacer_2,thickness], center=true);
}


/*____________________________________________________________________________*/
// spacer_3 : custom height above secondary hook, below top screw
module addH3 ()
{
    color ("DodgerBlue")
    cube ([stiffness,spacer_3,thickness], center=true);
}


/*____________________________________________________________________________*/
// spacer_4 : custom height above top screw, below rounded top
module addH4 ()
{
    color ("DarkBlue")
    cube ([stiffness,spacer_4,thickness], center=true);
}


/*____________________________________________________________________________*/
/*____________________________________________________________________________*/
/*____________________________________________________________________________*/
// Warning messages

if ((bracket)&&(safety_screw)&&(bracket_round!=true))
{
    if (thickness<screw_house*2)
    echo (" WARNING : Safety Screw Hole seems too big compare to Thickness ");
    if (screw_head_h>bracket_stiffness)
    echo (" WARNING : Safety Screw Head Height seems too big compare to Bracket Stiffness ");
    if (screw_head<=screw_diam)
    echo (" WARNING : Screw Head Diameter should be bigger than Screw Diameter ");
    if (bracket_size<=screw_house)
    echo (" WARNING : Bracket Size seems too small compare to Screw Holes ");
    if (stop_length<bracket_stiffness)
    echo (" WARNING : Stop length should be bigger than Bracket Stiffness ");
}

if (bracket!=true)
{
    if (thickness<screw_house*2)
    echo (" WARNING : Screw Holes seems too big compare to Thickness ");
    if (screw_head<=screw_diam)
    echo (" WARNING : Screw Head Diameter should be bigger than Screw Diameter ");
    if (screw_head_h>stiffness/2)
    echo (" WARNING : Screw Head Height seems too big compare to Hook Size");
}

if ((bracket!=true)&&(second_hook!=true))
{
    if (spacer_2+spacer_3<screw_house)
    echo (" WARNING : Screws seems too close. Push up value of Spacer 2 or 3 ");
}

if (second_hook)
{
    if (second_hook_length>hook_size)
    echo (" WARNING : Second Hook length should be smaller than Hook Size ");
    if (second_hook_length<hook_size/3)
    echo (" WARNING : Second Hook length seems very small compare to Hook Size ");
    if (second_hook_angle<45)
    echo (" WARNING : Best values for Second Hook Angle are between 45° and 65° ");
    if (second_hook_angle>65)
    echo (" WARNING : Best values for Second Hook Angle are between 45° and 65° ");
}
